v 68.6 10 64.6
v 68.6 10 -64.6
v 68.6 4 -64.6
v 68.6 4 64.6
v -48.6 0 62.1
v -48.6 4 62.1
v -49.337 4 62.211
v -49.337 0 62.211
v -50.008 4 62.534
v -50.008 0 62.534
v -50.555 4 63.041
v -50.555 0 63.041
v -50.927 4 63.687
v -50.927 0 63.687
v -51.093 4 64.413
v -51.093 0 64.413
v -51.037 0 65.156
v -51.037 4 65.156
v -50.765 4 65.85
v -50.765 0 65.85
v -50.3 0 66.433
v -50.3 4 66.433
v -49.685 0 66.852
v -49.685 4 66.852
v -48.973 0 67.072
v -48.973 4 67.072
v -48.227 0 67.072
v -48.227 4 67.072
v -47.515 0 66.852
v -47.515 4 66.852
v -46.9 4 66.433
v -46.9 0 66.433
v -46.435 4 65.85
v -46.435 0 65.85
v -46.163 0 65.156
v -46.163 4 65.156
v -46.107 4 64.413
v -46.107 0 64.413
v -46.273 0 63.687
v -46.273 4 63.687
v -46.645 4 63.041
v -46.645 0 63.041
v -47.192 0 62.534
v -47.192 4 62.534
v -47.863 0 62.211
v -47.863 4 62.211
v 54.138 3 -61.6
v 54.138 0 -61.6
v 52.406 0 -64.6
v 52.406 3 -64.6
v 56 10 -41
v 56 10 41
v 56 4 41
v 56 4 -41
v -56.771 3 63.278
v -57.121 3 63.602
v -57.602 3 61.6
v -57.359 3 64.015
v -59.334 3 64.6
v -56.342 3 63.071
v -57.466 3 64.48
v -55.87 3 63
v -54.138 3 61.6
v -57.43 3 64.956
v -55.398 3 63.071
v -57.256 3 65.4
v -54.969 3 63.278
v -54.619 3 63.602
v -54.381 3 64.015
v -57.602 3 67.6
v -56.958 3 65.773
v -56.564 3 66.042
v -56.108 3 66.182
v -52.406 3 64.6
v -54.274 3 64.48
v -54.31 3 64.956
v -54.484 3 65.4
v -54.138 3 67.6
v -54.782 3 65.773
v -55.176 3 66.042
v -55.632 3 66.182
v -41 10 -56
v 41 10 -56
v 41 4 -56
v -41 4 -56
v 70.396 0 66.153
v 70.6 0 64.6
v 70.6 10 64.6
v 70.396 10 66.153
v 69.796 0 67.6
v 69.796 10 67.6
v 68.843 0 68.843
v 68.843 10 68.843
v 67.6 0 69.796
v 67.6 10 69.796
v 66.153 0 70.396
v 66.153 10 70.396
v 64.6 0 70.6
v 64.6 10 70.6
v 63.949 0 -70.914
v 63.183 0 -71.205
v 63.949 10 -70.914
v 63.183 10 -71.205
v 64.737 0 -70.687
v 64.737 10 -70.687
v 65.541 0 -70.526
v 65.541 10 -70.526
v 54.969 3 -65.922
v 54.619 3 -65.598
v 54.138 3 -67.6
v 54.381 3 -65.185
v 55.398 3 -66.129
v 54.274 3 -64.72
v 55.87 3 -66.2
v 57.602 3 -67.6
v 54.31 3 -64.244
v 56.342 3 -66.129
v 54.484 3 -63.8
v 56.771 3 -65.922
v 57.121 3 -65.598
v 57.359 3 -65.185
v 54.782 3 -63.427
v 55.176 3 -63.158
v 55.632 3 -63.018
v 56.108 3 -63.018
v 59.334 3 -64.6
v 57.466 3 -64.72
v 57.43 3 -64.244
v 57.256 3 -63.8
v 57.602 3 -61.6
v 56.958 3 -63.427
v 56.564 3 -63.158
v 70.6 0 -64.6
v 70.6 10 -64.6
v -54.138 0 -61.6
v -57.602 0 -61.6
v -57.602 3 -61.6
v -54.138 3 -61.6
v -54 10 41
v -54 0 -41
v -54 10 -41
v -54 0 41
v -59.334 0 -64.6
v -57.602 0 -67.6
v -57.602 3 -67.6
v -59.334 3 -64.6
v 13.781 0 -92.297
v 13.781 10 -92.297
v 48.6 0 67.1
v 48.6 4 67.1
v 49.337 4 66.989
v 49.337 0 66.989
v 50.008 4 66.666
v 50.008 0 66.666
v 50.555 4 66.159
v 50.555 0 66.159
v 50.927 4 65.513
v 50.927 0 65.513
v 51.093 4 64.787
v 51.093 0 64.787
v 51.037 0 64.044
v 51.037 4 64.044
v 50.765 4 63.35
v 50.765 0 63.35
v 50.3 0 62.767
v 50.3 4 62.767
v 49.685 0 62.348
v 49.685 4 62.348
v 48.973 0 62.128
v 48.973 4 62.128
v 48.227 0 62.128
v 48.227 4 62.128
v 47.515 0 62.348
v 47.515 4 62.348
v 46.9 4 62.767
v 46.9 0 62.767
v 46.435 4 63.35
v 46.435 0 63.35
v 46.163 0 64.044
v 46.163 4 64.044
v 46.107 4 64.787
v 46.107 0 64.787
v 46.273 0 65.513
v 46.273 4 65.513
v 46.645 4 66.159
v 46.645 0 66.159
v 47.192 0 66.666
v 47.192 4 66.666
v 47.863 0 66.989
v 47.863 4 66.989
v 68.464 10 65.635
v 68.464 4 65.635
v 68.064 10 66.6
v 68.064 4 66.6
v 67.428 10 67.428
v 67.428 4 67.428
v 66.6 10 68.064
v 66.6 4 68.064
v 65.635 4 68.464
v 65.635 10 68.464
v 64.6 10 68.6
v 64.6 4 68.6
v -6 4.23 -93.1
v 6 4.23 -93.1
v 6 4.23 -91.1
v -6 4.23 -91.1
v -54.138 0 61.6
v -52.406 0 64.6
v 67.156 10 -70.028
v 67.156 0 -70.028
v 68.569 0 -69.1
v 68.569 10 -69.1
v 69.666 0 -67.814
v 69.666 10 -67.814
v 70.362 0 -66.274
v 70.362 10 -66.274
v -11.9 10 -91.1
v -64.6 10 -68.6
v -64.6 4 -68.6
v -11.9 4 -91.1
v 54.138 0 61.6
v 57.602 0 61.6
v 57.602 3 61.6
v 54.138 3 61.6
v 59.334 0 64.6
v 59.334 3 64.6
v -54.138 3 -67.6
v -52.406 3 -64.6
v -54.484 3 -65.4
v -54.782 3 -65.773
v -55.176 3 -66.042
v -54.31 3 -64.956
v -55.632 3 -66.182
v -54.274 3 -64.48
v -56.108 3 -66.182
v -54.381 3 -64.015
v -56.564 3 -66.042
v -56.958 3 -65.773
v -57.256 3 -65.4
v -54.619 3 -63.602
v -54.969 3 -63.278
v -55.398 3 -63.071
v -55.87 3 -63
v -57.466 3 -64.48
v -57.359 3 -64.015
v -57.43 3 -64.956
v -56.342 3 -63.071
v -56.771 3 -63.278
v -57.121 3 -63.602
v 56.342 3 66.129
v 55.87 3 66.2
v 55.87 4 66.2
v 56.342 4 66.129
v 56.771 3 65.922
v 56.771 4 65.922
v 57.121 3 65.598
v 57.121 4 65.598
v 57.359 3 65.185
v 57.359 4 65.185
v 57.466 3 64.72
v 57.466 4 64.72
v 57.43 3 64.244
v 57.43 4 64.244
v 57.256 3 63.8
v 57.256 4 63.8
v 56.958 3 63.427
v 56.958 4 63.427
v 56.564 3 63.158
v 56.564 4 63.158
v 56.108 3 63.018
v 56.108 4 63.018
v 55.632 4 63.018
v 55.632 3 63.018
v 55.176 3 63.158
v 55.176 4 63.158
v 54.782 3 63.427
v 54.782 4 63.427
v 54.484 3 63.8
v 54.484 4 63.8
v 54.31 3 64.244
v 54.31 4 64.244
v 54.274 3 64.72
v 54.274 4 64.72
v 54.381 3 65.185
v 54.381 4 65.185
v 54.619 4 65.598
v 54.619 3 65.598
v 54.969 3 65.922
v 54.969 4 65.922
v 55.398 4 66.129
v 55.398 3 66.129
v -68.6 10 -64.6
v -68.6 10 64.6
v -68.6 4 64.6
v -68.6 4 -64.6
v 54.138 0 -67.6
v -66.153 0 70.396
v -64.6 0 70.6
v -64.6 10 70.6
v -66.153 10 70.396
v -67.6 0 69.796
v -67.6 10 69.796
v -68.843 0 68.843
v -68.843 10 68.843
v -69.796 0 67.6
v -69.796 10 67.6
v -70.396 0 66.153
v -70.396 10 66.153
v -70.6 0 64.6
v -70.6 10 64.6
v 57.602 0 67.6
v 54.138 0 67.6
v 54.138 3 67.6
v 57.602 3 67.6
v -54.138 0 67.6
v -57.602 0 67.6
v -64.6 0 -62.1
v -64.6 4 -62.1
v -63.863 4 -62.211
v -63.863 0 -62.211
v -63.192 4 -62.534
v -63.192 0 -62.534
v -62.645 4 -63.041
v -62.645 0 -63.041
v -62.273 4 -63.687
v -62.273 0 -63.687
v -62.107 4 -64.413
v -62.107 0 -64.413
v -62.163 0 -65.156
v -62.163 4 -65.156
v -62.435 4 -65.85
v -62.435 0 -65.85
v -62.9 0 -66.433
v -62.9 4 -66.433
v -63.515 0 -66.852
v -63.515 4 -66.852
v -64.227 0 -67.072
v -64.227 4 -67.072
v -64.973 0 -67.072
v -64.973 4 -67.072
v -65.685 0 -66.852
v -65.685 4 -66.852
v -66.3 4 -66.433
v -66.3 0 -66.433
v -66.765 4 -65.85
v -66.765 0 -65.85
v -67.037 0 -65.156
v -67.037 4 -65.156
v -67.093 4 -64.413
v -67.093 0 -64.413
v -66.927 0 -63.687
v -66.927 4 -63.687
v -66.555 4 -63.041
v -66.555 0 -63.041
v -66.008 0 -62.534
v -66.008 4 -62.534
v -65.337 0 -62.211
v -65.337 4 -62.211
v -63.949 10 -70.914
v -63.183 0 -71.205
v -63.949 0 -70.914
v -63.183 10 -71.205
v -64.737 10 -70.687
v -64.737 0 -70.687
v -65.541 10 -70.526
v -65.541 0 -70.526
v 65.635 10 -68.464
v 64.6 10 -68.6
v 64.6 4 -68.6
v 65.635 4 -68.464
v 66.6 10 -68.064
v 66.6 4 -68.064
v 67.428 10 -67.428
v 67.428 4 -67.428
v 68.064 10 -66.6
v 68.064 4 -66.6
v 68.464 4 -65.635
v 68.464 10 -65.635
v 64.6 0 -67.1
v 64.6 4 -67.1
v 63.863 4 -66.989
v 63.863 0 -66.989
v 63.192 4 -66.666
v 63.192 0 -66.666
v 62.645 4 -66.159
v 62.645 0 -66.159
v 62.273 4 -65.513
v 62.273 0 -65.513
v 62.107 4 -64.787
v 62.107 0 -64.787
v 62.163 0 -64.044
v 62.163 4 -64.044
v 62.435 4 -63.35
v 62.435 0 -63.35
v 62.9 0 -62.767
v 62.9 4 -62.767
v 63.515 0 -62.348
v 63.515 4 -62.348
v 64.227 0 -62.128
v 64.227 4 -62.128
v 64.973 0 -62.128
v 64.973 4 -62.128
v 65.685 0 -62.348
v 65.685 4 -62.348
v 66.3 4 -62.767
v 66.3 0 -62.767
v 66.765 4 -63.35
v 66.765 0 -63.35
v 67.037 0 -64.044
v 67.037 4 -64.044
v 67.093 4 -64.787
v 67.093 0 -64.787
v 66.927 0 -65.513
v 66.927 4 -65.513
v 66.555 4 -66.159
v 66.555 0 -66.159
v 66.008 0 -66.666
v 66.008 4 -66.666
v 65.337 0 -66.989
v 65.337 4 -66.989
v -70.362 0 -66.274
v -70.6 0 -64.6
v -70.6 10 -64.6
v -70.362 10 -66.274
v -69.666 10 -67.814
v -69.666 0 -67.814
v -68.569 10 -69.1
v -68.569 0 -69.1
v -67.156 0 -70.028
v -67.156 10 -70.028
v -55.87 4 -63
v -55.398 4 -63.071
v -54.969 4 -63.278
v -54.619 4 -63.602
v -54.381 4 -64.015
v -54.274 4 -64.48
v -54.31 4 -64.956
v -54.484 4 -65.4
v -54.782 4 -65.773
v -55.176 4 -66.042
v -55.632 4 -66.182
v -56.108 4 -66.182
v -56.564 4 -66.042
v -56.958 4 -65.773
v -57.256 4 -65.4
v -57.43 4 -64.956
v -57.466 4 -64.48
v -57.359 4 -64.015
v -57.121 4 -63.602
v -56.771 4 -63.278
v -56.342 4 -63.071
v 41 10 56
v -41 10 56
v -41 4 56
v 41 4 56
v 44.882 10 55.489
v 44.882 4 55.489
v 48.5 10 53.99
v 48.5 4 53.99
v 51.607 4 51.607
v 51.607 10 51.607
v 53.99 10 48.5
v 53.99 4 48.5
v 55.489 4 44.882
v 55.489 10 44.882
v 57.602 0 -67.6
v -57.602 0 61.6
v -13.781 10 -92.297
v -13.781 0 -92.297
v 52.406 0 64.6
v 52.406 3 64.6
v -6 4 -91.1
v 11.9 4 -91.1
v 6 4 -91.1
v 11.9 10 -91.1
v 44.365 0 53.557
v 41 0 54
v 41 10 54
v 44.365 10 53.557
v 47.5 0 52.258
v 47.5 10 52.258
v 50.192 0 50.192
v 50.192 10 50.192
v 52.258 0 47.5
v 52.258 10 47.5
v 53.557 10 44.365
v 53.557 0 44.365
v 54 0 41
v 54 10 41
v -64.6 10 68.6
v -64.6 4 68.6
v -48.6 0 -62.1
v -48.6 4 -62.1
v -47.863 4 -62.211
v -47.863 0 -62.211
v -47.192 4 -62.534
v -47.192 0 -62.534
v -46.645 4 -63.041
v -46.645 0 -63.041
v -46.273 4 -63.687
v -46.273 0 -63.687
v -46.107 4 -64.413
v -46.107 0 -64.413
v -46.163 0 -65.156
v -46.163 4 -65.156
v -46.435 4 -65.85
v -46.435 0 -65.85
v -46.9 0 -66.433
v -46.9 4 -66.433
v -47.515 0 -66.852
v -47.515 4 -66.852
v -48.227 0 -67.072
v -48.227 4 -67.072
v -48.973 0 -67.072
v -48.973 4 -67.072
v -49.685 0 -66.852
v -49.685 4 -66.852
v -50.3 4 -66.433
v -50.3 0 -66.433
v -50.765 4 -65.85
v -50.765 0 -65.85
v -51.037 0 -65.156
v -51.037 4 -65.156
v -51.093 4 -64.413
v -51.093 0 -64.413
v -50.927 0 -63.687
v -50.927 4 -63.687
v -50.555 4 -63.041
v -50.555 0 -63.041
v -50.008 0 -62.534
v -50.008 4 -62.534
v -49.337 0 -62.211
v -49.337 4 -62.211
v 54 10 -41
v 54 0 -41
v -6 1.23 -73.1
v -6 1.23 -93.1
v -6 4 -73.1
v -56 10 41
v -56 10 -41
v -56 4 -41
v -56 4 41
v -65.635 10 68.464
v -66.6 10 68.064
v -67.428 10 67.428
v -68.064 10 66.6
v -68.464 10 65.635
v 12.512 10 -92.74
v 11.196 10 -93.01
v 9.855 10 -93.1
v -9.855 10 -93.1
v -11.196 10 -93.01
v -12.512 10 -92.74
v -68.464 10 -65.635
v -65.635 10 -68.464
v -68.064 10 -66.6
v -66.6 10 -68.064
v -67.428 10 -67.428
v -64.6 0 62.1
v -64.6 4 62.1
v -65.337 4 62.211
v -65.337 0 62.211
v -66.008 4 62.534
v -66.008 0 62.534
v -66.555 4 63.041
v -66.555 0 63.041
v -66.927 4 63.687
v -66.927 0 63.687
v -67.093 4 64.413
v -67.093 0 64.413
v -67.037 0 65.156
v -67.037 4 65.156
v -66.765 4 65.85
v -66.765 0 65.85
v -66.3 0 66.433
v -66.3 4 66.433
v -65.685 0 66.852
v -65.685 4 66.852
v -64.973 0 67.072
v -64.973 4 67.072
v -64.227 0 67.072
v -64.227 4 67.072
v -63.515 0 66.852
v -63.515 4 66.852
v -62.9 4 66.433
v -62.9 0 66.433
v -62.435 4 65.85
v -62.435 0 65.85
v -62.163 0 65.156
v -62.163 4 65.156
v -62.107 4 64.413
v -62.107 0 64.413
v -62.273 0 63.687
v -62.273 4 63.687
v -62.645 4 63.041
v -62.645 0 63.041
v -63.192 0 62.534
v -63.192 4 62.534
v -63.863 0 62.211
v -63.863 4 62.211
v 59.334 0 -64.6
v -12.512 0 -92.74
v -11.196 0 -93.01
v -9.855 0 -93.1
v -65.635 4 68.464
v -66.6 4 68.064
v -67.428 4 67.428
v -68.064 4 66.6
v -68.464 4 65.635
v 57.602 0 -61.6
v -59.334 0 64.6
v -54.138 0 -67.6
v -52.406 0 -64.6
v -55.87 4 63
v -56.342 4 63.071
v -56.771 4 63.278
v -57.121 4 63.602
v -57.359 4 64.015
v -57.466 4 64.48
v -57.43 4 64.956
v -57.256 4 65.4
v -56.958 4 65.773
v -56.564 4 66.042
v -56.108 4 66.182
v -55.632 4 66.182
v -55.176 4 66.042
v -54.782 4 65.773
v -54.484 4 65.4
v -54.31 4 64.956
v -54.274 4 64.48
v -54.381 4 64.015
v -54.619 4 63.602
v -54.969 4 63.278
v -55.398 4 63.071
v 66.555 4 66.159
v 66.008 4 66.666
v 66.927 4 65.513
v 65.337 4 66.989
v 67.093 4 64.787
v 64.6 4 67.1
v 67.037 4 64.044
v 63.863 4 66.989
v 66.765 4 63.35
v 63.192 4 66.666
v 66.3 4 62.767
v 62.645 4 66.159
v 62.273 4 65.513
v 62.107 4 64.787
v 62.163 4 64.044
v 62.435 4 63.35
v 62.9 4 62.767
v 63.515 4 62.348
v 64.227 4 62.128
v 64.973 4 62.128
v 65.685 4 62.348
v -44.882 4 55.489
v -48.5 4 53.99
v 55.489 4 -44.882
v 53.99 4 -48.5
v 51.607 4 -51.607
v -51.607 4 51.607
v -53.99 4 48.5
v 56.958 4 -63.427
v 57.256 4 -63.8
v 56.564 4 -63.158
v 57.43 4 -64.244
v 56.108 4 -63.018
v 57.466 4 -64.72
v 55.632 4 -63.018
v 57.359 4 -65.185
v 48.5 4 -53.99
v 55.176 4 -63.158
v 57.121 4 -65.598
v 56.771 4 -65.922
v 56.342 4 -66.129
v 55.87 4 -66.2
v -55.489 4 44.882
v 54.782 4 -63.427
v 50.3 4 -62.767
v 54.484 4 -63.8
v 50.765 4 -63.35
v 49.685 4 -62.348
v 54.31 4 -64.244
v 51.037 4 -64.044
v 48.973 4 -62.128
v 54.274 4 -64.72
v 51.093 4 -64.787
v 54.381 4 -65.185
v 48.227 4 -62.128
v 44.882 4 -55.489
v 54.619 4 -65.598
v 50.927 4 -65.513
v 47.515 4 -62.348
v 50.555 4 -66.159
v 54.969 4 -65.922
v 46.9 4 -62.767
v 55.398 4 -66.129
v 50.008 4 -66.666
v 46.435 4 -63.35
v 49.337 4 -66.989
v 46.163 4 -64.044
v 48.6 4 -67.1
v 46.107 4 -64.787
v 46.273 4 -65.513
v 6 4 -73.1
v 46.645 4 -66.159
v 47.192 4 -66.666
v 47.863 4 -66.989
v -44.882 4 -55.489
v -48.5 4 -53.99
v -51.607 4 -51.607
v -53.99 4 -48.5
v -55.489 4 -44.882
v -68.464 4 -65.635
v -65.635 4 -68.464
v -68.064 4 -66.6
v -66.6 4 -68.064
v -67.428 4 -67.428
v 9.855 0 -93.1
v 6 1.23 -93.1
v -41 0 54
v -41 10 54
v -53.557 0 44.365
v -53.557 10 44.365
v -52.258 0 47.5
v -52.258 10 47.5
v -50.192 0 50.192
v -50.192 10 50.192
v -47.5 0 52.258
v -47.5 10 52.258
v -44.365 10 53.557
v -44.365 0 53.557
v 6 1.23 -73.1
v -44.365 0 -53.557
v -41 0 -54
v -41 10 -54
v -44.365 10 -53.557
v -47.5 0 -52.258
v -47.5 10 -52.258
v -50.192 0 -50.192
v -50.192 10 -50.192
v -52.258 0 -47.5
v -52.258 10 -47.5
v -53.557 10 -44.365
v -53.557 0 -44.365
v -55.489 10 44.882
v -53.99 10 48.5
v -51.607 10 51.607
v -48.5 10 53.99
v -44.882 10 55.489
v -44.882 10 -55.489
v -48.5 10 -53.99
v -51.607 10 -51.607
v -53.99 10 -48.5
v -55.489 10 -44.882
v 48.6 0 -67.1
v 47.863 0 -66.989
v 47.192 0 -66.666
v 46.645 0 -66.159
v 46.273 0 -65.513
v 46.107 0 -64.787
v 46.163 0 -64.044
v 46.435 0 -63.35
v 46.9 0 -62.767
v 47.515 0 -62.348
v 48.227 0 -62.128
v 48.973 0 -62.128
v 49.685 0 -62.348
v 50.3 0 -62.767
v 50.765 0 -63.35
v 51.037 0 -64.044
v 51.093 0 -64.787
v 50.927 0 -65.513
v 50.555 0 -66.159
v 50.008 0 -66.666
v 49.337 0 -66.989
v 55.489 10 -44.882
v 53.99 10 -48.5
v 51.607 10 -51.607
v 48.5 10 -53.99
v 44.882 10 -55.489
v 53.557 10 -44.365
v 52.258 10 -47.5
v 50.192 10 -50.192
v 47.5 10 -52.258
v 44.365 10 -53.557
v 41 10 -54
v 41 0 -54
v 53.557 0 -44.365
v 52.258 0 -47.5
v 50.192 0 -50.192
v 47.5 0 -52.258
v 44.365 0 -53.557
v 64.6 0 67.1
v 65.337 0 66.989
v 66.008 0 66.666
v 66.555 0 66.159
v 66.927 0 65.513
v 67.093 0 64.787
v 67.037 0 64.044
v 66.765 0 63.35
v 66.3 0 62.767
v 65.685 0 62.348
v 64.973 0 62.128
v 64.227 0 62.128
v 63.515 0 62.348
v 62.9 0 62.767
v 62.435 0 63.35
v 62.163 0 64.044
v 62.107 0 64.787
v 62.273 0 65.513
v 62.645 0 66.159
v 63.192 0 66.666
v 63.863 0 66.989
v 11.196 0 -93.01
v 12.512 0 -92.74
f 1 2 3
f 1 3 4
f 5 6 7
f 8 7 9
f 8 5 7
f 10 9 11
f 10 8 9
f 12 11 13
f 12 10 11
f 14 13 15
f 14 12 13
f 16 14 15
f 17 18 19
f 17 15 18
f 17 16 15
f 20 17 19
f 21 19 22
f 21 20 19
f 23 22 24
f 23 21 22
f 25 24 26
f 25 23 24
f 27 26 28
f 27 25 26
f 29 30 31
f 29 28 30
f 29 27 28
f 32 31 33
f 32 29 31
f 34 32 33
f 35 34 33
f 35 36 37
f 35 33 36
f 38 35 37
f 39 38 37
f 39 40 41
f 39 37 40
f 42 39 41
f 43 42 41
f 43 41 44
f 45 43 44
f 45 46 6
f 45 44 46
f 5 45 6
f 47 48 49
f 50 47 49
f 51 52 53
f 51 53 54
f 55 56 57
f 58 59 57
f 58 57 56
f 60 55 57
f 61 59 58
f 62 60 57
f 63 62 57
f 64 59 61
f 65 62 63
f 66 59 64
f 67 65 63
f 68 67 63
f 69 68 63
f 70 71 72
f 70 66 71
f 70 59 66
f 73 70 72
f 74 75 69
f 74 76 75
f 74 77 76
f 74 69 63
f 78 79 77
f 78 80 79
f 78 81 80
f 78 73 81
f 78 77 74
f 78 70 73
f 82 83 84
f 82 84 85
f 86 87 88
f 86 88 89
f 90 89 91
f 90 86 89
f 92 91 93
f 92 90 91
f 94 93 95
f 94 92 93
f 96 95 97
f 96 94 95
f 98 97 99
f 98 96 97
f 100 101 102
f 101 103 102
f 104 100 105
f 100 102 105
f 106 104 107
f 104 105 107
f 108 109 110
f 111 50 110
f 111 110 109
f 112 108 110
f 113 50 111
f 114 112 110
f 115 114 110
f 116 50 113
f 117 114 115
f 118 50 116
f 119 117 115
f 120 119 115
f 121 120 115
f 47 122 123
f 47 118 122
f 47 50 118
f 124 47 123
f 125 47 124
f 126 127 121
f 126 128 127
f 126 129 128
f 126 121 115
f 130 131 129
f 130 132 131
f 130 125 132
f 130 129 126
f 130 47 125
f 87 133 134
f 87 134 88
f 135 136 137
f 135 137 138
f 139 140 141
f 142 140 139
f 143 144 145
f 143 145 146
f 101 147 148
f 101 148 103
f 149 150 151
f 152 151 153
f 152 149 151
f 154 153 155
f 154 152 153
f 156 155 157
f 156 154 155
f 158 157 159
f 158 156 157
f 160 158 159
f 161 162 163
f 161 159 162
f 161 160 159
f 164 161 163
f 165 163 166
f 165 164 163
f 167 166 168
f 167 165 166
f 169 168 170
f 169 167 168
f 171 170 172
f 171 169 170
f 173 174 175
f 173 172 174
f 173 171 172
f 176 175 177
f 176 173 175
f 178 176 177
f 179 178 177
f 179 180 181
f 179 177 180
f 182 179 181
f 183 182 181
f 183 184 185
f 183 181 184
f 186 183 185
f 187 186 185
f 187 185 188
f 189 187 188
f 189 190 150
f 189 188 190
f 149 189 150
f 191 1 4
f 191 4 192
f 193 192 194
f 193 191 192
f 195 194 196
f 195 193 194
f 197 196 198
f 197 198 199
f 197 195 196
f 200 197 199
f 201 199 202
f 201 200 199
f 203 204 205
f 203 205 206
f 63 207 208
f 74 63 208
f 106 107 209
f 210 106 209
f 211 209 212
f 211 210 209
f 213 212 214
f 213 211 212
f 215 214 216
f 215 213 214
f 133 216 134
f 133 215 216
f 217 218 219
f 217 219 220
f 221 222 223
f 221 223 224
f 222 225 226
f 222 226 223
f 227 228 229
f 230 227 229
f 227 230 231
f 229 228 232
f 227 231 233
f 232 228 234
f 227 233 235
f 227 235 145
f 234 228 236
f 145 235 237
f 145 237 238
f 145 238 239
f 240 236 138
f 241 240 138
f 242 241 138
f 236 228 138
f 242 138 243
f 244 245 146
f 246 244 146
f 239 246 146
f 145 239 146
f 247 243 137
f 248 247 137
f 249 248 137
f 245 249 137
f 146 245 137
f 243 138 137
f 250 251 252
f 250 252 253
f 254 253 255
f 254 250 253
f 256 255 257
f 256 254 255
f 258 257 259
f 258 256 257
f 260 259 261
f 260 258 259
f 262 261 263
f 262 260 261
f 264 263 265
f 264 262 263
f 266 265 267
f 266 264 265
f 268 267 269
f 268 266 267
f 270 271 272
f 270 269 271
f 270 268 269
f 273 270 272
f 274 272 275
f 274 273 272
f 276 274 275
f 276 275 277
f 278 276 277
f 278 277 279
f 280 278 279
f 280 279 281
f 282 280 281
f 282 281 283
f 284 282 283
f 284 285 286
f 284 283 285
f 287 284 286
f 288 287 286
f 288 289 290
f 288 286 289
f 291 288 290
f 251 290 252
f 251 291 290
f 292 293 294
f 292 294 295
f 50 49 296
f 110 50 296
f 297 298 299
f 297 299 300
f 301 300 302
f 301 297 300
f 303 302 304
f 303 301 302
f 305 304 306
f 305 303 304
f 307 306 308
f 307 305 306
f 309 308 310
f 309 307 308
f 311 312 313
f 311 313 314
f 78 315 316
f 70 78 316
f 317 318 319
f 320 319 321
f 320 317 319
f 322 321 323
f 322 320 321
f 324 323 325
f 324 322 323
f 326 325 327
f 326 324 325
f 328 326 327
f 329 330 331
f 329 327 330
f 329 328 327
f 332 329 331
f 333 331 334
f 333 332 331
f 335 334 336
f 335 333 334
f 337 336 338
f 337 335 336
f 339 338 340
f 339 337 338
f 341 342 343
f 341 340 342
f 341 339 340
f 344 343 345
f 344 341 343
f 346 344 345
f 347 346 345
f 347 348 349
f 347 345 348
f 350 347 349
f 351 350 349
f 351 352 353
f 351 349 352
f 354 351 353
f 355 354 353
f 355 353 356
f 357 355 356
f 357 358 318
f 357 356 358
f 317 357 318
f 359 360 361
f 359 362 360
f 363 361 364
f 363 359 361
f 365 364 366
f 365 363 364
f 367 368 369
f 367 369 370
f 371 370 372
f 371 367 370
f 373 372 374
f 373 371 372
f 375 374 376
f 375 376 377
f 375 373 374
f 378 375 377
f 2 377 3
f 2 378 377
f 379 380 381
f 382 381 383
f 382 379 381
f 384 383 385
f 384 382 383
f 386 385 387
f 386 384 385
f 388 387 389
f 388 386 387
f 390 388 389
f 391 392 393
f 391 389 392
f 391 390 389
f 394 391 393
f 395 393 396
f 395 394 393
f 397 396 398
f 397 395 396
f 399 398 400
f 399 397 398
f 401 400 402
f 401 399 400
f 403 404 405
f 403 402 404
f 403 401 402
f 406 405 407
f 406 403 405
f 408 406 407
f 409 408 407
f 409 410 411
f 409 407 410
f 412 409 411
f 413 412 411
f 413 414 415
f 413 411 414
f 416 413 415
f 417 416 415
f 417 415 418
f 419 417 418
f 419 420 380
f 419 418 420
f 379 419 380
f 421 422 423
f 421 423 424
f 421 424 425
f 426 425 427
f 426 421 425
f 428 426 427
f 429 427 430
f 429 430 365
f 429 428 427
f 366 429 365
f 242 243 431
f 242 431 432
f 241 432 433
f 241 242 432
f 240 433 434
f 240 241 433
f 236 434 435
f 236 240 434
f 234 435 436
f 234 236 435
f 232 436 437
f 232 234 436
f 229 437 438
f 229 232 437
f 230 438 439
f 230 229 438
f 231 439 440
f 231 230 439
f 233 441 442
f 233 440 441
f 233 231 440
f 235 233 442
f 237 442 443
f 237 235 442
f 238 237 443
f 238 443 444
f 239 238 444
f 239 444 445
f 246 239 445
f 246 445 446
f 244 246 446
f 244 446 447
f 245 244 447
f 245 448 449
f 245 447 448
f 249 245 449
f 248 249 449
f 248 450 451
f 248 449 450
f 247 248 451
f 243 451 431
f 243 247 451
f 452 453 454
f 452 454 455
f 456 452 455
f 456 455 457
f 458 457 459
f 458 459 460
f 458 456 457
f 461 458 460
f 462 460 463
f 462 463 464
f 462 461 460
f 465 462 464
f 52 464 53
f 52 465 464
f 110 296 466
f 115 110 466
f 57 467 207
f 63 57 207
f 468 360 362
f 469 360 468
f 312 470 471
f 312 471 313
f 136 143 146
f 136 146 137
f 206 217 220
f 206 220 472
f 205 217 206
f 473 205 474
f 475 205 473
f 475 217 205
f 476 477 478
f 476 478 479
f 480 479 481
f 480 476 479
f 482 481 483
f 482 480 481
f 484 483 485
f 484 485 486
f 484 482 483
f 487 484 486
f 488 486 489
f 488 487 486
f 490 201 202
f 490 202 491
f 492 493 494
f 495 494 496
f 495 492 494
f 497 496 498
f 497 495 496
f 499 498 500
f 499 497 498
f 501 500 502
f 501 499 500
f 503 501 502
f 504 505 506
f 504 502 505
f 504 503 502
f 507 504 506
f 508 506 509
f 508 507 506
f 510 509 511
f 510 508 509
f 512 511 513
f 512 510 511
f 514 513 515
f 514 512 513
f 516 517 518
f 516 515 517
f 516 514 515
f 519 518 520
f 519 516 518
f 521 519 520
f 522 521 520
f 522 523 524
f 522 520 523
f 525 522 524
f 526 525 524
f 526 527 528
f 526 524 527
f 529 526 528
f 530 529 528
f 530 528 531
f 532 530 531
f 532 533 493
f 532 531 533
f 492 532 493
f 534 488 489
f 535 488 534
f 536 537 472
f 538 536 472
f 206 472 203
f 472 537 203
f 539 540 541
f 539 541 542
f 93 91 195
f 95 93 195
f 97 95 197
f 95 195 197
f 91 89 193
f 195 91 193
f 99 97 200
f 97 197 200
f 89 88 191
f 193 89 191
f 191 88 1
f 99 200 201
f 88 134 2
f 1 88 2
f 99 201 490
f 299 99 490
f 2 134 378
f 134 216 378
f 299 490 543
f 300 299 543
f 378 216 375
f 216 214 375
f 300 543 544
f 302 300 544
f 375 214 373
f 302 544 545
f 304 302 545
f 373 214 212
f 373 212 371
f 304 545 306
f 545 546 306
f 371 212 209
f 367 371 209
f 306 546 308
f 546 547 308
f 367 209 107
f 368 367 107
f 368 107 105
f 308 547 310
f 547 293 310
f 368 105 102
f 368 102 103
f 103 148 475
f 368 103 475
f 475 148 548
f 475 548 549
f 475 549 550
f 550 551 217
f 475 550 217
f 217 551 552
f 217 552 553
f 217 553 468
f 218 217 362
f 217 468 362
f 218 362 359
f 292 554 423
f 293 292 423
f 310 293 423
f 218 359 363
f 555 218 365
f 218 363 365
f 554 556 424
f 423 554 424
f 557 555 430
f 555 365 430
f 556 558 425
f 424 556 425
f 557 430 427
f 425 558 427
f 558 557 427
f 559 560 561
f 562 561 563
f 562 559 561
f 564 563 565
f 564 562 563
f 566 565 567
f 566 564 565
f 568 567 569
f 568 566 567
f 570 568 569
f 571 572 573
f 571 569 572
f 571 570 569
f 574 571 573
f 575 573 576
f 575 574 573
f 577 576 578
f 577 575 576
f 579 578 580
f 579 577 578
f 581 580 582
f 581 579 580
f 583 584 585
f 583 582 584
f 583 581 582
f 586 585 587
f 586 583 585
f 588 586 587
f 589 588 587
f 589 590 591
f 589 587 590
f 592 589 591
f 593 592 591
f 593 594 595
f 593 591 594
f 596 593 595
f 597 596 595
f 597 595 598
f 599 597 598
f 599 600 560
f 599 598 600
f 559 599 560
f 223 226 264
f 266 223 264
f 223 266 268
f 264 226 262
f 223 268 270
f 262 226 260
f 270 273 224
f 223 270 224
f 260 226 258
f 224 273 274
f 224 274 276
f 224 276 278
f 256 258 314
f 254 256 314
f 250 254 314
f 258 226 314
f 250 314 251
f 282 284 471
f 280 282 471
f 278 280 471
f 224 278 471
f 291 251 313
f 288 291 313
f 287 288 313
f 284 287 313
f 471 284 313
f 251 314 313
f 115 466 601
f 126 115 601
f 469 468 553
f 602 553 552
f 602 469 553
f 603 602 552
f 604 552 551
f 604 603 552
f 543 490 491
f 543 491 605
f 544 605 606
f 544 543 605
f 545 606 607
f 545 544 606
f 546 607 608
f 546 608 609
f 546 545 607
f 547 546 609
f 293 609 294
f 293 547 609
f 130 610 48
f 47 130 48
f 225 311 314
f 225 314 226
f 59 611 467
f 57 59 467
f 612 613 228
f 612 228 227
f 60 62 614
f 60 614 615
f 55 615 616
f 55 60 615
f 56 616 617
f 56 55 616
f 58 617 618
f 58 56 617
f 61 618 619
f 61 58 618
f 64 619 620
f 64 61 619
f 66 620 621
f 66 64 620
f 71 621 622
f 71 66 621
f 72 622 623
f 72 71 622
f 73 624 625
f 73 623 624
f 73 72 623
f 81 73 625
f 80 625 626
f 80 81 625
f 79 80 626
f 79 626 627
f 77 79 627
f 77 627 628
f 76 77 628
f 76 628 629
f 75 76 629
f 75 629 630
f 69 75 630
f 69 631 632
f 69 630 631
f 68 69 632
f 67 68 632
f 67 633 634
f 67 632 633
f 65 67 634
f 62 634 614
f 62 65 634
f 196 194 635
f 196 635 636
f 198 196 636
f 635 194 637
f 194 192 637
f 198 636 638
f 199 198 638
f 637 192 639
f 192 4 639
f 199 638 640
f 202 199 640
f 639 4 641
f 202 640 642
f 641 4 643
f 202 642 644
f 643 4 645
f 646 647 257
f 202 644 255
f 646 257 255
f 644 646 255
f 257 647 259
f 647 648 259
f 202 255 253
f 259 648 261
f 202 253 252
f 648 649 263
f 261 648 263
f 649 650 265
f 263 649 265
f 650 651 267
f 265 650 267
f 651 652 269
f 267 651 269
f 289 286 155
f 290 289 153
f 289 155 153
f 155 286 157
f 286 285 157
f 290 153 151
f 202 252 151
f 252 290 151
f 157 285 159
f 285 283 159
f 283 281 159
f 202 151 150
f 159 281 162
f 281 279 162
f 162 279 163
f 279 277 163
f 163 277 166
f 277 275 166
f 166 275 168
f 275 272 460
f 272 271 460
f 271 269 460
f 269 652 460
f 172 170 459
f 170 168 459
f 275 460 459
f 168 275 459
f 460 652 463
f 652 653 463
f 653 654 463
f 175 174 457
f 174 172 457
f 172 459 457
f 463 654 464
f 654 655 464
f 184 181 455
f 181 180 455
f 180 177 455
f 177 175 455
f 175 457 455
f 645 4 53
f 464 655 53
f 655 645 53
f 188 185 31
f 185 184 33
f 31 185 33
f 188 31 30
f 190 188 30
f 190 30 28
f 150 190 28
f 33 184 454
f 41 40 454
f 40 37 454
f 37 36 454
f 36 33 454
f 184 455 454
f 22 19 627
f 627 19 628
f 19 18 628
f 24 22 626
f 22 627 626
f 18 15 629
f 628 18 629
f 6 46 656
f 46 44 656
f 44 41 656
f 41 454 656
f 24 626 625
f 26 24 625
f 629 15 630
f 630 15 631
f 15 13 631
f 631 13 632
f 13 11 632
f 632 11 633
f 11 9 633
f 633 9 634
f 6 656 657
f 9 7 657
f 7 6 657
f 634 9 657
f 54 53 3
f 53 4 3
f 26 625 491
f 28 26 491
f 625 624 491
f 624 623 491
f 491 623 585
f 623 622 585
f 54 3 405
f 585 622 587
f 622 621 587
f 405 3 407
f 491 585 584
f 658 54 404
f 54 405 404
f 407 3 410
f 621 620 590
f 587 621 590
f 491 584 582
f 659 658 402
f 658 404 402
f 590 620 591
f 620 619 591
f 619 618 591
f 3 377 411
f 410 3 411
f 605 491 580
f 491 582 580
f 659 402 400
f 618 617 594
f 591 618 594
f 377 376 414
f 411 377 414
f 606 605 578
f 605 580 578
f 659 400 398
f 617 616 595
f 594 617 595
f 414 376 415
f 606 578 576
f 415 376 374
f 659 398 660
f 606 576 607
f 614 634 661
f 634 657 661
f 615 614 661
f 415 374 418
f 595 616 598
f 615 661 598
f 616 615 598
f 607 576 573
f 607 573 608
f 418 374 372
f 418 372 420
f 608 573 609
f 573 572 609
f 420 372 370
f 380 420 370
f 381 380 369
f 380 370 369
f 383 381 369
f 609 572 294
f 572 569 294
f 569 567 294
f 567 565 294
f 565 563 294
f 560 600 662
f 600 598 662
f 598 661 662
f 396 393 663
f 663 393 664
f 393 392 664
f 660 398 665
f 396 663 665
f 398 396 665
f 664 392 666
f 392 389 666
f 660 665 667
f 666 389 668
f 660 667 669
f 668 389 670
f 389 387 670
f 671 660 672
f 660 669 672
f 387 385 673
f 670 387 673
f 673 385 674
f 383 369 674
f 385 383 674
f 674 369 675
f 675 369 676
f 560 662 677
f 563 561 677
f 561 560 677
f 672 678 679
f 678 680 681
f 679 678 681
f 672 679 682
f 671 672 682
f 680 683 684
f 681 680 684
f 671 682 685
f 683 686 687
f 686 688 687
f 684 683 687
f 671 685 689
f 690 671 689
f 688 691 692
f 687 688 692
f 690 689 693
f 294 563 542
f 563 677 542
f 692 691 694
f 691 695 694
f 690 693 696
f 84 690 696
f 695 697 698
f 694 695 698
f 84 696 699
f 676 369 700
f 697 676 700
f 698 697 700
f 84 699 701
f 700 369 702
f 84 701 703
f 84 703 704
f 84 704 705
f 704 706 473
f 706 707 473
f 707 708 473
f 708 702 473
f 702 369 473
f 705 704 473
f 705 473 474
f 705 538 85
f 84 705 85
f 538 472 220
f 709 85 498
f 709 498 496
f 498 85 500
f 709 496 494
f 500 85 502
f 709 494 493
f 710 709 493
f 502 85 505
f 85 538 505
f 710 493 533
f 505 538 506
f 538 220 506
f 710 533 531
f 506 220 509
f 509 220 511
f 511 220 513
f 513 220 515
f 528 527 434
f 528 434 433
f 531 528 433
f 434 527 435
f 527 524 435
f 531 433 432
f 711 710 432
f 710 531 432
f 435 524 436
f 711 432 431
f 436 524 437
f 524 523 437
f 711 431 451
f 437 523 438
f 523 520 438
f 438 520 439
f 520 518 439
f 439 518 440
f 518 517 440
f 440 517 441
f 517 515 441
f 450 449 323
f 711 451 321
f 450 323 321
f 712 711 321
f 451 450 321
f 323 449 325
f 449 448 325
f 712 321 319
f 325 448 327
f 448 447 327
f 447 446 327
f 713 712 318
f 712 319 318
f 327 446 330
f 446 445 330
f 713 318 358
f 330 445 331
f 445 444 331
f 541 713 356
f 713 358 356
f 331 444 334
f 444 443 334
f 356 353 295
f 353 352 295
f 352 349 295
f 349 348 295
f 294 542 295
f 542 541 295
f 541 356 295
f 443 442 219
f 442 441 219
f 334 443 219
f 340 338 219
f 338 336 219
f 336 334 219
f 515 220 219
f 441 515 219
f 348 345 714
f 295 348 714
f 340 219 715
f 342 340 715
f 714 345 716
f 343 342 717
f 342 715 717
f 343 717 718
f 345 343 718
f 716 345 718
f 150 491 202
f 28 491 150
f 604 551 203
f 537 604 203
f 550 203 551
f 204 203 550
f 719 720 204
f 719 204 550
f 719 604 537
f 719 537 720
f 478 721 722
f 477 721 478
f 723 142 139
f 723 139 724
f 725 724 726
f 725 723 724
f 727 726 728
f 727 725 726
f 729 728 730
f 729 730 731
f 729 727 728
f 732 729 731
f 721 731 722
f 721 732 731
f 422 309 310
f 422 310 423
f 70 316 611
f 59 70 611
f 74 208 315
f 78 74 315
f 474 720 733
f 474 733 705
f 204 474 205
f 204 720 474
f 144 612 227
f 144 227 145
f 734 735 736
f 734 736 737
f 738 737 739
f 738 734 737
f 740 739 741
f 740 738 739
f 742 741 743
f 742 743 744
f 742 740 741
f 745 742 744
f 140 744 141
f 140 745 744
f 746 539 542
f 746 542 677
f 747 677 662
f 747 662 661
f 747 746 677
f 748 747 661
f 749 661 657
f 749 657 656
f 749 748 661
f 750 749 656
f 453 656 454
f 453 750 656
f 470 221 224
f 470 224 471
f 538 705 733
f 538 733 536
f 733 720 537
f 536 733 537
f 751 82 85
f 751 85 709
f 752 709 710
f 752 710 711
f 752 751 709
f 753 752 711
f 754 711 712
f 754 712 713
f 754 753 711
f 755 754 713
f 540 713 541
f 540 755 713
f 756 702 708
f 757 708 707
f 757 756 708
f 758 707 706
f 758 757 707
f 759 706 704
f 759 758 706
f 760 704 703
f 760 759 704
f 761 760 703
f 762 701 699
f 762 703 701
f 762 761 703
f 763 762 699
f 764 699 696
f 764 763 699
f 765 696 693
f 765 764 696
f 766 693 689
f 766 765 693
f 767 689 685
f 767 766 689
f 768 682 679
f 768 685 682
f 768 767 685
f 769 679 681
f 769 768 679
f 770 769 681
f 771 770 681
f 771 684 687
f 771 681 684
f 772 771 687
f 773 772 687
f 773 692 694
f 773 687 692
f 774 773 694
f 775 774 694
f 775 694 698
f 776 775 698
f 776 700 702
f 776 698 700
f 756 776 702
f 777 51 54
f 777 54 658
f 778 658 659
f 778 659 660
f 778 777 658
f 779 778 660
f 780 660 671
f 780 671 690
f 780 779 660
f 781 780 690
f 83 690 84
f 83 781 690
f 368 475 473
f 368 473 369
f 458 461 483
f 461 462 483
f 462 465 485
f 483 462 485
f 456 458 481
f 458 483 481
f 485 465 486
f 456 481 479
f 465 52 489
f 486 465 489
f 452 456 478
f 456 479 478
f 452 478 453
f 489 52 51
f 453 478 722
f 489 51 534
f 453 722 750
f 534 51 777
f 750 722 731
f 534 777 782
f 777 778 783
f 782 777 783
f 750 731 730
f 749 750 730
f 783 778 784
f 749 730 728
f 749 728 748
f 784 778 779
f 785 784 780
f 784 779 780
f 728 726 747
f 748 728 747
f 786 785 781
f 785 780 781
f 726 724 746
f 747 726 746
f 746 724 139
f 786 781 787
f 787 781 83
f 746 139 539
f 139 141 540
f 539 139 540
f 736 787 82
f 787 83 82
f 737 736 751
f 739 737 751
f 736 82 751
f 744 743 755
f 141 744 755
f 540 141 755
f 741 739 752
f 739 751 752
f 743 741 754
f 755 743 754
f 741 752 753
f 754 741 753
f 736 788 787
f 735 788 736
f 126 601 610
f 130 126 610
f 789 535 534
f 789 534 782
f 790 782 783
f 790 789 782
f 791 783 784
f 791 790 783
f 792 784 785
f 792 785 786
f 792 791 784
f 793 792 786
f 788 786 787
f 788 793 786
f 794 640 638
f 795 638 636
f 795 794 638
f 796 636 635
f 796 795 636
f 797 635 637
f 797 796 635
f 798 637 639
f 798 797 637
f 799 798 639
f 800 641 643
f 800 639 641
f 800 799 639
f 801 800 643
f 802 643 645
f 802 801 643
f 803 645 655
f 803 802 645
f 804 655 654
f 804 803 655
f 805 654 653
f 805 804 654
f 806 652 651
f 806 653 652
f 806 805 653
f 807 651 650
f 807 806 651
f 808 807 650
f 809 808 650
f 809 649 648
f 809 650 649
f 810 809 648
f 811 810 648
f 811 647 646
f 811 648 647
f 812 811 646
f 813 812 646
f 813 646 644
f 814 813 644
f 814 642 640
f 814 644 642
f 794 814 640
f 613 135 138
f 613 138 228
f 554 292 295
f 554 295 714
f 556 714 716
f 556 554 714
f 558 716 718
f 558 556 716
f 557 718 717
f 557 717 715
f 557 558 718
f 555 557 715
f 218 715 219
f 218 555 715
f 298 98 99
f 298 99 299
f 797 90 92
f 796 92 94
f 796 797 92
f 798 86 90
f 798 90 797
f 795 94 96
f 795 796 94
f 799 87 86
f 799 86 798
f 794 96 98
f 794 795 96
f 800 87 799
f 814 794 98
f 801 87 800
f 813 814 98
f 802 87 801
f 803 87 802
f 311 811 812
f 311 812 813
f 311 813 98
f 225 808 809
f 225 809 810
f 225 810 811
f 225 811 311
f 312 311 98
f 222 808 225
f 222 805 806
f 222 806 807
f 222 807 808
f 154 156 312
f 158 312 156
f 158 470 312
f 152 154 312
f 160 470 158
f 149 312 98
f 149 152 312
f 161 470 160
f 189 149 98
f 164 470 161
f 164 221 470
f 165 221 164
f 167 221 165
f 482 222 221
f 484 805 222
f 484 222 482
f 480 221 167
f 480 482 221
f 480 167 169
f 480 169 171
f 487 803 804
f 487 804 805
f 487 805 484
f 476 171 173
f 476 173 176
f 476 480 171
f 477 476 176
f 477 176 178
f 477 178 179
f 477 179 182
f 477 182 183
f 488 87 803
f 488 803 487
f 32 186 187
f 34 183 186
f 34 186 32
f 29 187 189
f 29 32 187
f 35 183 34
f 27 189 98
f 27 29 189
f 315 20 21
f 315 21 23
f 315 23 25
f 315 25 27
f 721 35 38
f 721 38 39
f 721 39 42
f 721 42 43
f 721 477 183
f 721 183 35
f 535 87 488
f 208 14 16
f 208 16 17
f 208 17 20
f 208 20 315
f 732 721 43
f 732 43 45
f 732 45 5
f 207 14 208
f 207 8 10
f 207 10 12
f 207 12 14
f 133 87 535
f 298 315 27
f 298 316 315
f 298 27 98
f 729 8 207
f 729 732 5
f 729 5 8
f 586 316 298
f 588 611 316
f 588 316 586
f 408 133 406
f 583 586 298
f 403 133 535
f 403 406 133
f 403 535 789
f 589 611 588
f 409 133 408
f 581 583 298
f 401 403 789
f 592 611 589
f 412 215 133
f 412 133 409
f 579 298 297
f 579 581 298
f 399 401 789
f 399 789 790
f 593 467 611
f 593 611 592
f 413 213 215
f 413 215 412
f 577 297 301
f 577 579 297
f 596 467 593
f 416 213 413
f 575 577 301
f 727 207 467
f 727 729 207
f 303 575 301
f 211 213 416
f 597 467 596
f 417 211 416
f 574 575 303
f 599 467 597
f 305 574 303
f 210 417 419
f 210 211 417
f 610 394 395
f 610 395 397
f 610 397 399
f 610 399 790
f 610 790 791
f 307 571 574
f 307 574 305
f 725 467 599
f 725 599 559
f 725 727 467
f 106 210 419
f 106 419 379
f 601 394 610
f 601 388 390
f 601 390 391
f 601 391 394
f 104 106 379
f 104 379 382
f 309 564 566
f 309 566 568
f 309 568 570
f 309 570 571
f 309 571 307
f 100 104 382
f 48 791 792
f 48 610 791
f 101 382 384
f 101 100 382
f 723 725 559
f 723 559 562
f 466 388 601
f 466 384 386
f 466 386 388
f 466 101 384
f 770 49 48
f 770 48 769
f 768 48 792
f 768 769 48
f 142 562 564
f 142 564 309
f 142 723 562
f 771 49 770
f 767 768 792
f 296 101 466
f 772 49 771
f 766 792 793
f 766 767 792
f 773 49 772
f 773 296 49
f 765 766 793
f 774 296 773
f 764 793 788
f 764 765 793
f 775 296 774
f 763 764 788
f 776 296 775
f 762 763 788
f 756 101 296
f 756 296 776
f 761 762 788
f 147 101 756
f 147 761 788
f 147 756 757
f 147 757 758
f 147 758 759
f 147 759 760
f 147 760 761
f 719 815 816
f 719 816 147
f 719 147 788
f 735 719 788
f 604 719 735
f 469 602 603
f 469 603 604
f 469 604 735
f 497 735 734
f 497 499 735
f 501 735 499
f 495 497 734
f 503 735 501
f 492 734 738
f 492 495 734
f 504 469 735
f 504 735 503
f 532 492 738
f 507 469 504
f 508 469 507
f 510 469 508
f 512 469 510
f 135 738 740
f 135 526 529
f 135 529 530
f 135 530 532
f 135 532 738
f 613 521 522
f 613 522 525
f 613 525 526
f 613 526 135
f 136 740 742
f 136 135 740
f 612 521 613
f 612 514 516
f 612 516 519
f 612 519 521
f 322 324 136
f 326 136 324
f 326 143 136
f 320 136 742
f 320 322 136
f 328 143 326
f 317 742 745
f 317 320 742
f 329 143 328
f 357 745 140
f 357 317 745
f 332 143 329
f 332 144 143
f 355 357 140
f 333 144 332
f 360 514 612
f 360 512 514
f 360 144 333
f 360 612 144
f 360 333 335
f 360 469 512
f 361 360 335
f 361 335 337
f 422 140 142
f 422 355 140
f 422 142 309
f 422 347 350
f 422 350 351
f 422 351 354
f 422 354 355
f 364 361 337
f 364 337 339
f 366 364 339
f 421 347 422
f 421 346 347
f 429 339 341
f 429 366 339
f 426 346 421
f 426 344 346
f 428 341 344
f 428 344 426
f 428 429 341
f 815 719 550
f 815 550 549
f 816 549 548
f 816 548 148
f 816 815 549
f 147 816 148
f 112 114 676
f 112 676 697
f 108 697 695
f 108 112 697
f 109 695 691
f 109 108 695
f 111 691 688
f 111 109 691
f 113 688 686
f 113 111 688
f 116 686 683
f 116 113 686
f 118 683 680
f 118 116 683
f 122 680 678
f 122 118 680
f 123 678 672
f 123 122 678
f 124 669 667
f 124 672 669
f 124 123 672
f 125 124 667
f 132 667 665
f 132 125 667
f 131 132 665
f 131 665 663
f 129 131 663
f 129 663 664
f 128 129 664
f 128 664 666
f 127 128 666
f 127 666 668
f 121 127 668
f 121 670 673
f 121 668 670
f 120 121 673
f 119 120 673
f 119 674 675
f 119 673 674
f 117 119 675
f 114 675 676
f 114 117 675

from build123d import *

# Parameters (mm, degrees)
BOSS_EXTRUDE1_DEPTH = 10
CUT_EXTRUDE1_DEPTH  = 6
SKETCH3_R           = 2.5
SKETCH3_R_2         = 1.6
CUT_EXTRUDE5_DEPTH  = 118.268793803
CUT_EXTRUDE6_DEPTH  = 3
FILLET1_R           = 10
SKETCH7_W           = 12
SKETCH7_H           = 3
CUT_EXTRUDE7_DEPTH  = 20


with BuildPart() as part:
    # Sketch1 → Boss-Extrude1 (new body)
    with BuildSketch(Plane(origin=(0, 0, 0), x_dir=(1, 0, 0), z_dir=(0, 1, 0))):
        with BuildLine():
            Line((-64.6, 70.6), (-13.781138102, 92.296857547))
            ThreePointArc((-13.781138102, 92.296857547), (-11.858510235, 92.897157125), (-9.854586018, 93.1))
            Line((-9.854586018, 93.1), (9.854586018, 93.1))
            ThreePointArc((9.854586018, 93.1), (11.858510235, 92.897157125), (13.781138102, 92.296857547))
            Line((13.781138102, 92.296857547), (64.6, 70.6))
            ThreePointArc((64.6, 70.6), (68.842640687, 68.842640687), (70.6, 64.6))
            Line((70.6, 64.6), (70.6, -64.6))
            ThreePointArc((70.6, -64.6), (68.842640687, -68.842640687), (64.6, -70.6))
            Line((64.6, -70.6), (-64.6, -70.6))
            ThreePointArc((-64.6, -70.6), (-68.842640687, -68.842640687), (-70.6, -64.6))
            Line((-70.6, -64.6), (-70.6, 64.6))
            ThreePointArc((-70.6, 64.6), (-68.842640687, 68.842640687), (-64.6, 70.6))
        make_face()
        with BuildLine():
            Line((-41, -54), (41, -54))
            ThreePointArc((41, -54), (50.192388155, -50.192388155), (54, -41))
            Line((54, -41), (54, 41))
            ThreePointArc((54, 41), (50.192388155, 50.192388155), (41, 54))
            Line((41, 54), (-41, 54))
            ThreePointArc((-41, 54), (-50.192388155, 50.192388155), (-54, 41))
            Line((-54, 41), (-54, -41))
            ThreePointArc((-54, -41), (-50.192388155, -50.192388155), (-41, -54))
        make_face(mode=Mode.SUBTRACT)
    extrude(amount=BOSS_EXTRUDE1_DEPTH)

    # Sketch2 → Cut-Extrude1 (cut)
    with BuildSketch(Plane(origin=(0, 10, 0), x_dir=(1, 0, 0), z_dir=(0, 1, 0))):
        with BuildLine():
            Line((-64.6, 68.6), (-11.9, 91.1))
            Line((-11.9, 91.1), (11.9, 91.1))
            Line((11.9, 91.1), (64.6, 68.6))
            ThreePointArc((64.6, 68.6), (67.428427125, 67.428427125), (68.6, 64.6))
            Line((68.6, 64.6), (68.6, -64.6))
            ThreePointArc((68.6, -64.6), (67.428427125, -67.428427125), (64.6, -68.6))
            Line((64.6, -68.6), (-64.6, -68.6))
            ThreePointArc((-64.6, -68.6), (-67.428427125, -67.428427125), (-68.6, -64.6))
            Line((-68.6, -64.6), (-68.6, 64.6))
            ThreePointArc((-68.6, 64.6), (-67.428427125, 67.428427125), (-64.6, 68.6))
        make_face()
        with BuildLine():
            Line((-41, -56), (41, -56))
            ThreePointArc((41, -56), (51.606601718, -51.606601718), (56, -41))
            Line((56, -41), (56, 41))
            ThreePointArc((56, 41), (51.606601718, 51.606601718), (41, 56))
            Line((41, 56), (-41, 56))
            ThreePointArc((-41, 56), (-51.606601718, 51.606601718), (-56, 41))
            Line((-56, 41), (-56, -41))
            ThreePointArc((-56, -41), (-51.606601718, -51.606601718), (-41, -56))
        make_face(mode=Mode.SUBTRACT)
    extrude(amount=-CUT_EXTRUDE1_DEPTH, mode=Mode.SUBTRACT)

    # Sketch3 → Cut-Extrude5 (cut, through all)
    with BuildSketch(Plane(origin=(0, 0, 0), x_dir=(1, 0, 0), z_dir=(0, 1, 0))):
        with Locations(Location((-64.6, 64.6, 0), (0, 0, 270))):
            Circle(SKETCH3_R)
        with Locations(Location((-48.6, 64.6, 0), (0, 0, 270))):
            Circle(SKETCH3_R)
        with Locations(Location((-55.87, 64.6, 0), (0, 0, 270))):
            Circle(SKETCH3_R_2)
        with Locations(Location((55.87, 64.6, 0), (0, 0, 90))):
            Circle(SKETCH3_R_2)
        with Locations(Location((48.6, 64.6, 0), (0, 0, 90))):
            Circle(SKETCH3_R)
        with Locations(Location((64.6, 64.6, 0), (0, 0, 90))):
            Circle(SKETCH3_R)
        with Locations(Location((64.6, -64.6, 0), (0, 0, 270))):
            Circle(SKETCH3_R)
        with Locations(Location((48.6, -64.6, 0), (0, 0, 270))):
            Circle(SKETCH3_R)
        with Locations(Location((55.87, -64.6, 0), (0, 0, 270))):
            Circle(SKETCH3_R_2)
        with Locations(Location((-55.87, -64.6, 0), (0, 0, 90))):
            Circle(SKETCH3_R_2)
        with Locations(Location((-48.6, -64.6, 0), (0, 0, 90))):
            Circle(SKETCH3_R)
        with Locations(Location((-64.6, -64.6, 0), (0, 0, 90))):
            Circle(SKETCH3_R)
    extrude(amount=CUT_EXTRUDE5_DEPTH, mode=Mode.SUBTRACT)

    # Sketch6 → Cut-Extrude6 (cut)
    with BuildSketch(Plane.XZ):
        Polygon((-52.405898385, 64.6), (-54.137949192, 67.6), (-57.602050808, 67.6), (-59.334101615, 64.6), (-57.602050808, 61.6), (-54.137949192, 61.6), align=None)
        Polygon((-54.137949192, -61.6), (-52.405898385, -64.6), (-54.137949192, -67.6), (-57.602050808, -67.6), (-59.334101615, -64.6), (-57.602050808, -61.6), align=None)
        Polygon((52.405898385, -64.6), (54.137949192, -67.6), (57.602050808, -67.6), (59.334101615, -64.6), (57.602050808, -61.6), (54.137949192, -61.6), align=None)
        Polygon((54.137949192, 61.6), (52.405898385, 64.6), (54.137949192, 67.6), (57.602050808, 67.6), (59.334101615, 64.6), (57.602050808, 61.6), align=None)
    extrude(amount=-CUT_EXTRUDE6_DEPTH, mode=Mode.SUBTRACT)

    # Fillet1
    fillet1_edges = [part.edges().sort_by_distance(p)[0] for p in [
        (-64.6, 5, -70.6),
        (64.6, 5, -70.6),
    ]]
    fillet(fillet1_edges, radius=FILLET1_R)

    # Sketch7 → Cut-Extrude7 (cut)
    with BuildSketch(Plane(origin=(0, 0, -93.1), x_dir=(-1, 0, 0), z_dir=(0, 0, -1))):
        with Locations((0, 2.73)):
            Rectangle(SKETCH7_W, SKETCH7_H)
    extrude(amount=-CUT_EXTRUDE7_DEPTH, mode=Mode.SUBTRACT)


solid = part.part
